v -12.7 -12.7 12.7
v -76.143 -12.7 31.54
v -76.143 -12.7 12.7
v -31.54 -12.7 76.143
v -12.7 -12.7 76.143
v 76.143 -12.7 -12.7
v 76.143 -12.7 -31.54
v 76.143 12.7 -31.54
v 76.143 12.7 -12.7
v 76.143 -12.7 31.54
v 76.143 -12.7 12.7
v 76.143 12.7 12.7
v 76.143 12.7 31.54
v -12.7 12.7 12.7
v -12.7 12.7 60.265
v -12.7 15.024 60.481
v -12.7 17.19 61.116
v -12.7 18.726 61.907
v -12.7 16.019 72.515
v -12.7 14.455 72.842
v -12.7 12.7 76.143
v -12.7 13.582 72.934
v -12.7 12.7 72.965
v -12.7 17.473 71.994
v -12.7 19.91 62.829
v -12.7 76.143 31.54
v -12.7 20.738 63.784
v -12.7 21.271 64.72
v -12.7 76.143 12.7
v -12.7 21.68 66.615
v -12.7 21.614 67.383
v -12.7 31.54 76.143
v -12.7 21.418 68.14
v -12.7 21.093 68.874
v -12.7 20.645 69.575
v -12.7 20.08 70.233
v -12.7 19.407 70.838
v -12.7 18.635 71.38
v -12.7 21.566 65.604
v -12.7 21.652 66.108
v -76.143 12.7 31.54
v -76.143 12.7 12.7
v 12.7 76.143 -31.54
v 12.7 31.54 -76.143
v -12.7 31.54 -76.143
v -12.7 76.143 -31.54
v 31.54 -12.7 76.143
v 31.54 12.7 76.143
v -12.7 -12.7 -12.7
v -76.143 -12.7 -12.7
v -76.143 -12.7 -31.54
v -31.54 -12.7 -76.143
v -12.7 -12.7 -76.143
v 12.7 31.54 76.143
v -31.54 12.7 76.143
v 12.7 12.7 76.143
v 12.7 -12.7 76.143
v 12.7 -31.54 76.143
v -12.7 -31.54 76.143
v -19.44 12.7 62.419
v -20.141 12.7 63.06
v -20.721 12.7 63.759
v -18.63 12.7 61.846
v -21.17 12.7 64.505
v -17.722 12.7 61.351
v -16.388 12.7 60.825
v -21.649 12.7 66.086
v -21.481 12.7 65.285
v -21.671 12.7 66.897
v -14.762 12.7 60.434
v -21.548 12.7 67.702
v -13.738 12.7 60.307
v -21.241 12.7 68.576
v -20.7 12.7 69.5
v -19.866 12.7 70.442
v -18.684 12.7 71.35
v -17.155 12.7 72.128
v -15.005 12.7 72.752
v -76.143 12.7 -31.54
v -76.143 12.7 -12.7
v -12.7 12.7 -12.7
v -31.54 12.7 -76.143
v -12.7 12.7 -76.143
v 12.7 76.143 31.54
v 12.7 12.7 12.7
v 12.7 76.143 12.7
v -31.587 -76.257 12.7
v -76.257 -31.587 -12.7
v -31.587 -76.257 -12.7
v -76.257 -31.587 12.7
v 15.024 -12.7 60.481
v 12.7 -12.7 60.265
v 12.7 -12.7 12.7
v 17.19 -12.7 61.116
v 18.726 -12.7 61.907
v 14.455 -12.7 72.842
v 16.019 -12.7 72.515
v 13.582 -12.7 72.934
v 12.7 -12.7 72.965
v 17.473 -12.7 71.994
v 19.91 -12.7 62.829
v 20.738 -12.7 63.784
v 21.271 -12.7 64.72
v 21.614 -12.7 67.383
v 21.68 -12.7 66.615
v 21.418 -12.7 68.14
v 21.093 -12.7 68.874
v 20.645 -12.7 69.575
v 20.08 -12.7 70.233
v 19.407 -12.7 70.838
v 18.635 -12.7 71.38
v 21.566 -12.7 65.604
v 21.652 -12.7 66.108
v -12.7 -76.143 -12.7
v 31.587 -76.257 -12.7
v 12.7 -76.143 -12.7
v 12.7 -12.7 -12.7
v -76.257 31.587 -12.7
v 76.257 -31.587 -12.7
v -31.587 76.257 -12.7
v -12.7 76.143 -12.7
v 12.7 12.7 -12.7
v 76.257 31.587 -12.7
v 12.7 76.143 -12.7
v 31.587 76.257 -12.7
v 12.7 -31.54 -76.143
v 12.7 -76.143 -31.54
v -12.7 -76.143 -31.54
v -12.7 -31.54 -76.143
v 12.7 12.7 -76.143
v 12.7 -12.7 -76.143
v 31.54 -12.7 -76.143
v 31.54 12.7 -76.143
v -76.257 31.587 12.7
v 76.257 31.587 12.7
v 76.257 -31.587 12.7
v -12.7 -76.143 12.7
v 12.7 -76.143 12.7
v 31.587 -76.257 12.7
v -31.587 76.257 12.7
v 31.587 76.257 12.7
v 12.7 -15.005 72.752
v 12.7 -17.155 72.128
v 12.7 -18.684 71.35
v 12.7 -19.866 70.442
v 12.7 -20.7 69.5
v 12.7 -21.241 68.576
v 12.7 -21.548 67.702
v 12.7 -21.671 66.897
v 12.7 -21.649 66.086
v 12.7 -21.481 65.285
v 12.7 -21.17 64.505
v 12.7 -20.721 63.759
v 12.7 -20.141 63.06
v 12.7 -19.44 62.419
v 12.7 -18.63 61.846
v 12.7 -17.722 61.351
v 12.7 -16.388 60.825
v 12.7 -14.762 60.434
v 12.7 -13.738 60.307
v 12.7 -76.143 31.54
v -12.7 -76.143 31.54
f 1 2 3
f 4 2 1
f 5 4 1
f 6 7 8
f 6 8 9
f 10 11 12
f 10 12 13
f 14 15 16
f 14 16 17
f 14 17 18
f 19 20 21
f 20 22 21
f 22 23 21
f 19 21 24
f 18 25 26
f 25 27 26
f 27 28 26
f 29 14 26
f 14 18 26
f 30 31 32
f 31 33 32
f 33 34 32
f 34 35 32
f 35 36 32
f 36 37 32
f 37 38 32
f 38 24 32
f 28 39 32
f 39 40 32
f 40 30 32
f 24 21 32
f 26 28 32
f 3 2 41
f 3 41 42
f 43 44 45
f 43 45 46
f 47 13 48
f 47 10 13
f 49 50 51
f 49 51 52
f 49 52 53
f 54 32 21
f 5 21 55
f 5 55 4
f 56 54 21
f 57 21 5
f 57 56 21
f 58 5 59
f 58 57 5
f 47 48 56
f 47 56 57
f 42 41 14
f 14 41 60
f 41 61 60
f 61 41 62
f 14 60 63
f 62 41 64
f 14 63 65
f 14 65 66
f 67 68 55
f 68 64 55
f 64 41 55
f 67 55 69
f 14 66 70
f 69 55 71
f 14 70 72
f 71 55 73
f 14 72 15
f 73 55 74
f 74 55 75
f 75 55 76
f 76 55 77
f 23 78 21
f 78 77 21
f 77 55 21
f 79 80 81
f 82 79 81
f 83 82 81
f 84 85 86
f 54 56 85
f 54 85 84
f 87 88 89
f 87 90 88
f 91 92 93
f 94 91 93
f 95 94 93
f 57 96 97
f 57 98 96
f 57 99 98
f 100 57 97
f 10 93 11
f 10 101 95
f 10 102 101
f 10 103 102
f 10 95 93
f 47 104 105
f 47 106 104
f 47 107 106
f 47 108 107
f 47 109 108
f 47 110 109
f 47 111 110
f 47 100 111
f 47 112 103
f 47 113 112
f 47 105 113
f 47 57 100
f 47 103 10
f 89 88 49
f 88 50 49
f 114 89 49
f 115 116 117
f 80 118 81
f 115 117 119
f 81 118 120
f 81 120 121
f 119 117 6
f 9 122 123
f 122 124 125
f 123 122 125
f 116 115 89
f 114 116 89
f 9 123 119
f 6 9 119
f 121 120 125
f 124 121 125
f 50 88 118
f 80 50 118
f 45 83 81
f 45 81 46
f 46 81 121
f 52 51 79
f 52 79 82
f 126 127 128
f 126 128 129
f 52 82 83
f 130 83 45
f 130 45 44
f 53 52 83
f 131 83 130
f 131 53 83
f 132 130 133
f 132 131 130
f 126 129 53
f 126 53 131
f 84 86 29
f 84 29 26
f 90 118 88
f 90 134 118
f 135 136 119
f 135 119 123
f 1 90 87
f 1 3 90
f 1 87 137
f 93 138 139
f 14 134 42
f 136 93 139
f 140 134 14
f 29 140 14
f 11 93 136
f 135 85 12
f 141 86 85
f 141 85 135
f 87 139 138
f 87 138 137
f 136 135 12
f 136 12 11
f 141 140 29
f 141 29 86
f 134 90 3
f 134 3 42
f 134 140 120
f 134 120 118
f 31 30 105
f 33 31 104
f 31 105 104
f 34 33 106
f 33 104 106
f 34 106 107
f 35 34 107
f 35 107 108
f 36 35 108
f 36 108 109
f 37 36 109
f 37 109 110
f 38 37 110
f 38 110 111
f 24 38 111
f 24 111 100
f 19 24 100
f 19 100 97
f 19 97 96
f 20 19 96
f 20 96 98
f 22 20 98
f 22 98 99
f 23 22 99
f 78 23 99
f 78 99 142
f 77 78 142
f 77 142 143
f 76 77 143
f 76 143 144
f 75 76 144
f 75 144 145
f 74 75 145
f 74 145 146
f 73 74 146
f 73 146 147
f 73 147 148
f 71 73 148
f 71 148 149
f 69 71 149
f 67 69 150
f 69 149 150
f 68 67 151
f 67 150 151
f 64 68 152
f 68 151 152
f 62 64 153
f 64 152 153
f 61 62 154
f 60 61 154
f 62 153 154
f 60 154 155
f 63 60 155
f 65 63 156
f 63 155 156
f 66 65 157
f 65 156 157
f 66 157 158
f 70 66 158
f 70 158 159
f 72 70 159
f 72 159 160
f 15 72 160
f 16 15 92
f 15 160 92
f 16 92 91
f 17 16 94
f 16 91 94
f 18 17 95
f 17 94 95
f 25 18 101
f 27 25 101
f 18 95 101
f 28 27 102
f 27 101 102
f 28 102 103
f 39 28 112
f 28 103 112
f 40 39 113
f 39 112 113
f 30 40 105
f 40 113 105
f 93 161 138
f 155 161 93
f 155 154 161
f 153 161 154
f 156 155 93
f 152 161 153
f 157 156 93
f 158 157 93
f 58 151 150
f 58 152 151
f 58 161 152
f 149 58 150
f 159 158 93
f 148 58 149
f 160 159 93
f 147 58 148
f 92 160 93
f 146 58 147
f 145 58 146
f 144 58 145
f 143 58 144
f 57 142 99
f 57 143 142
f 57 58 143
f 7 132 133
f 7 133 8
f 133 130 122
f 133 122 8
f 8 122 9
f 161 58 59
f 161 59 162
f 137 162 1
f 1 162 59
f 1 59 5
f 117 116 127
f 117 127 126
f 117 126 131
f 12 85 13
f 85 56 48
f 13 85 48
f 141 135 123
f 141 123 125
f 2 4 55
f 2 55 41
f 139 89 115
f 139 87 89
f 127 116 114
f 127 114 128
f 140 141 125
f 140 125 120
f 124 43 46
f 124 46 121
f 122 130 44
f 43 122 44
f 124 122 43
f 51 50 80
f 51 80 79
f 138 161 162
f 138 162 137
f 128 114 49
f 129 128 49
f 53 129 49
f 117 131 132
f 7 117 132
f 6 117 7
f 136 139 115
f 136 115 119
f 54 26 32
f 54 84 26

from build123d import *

# Parameters (mm, degrees)
F1_DEPTH = 12.7
F3_DEPTH = 12.7
F5_DEPTH = 12.7
F7_R     = 6.35
F8_DEPTH = 63.5


with BuildPart() as f1:
    # F0 (on Front) → F1 (new body, symmetric)
    with BuildSketch(Plane.XZ):
        Polygon((31.5395204871, 76.1431381106), (-31.5395204871, 76.1431381106), (-76.1431381106, 31.5395204871), (-76.1431381106, -31.5395204871), (-31.5395204871, -76.1431381106), (31.5395204871, -76.1431381106), (76.1431381106, -31.5395204871), (76.1431381106, 31.5395204871), align=None)
    extrude(amount=F1_DEPTH, both=True)

    # F2 (on Top) → F3 (join, symmetric)
    with BuildSketch(Plane.XY):
        Polygon((-31.5866271988, -76.2568637729), (31.5866271988, -76.2568637729), (76.2568637729, -31.5866271988), (76.2568637729, 31.5866271988), (31.5866271988, 76.2568637729), (-31.5866271988, 76.2568637729), (-76.2568637729, 31.5866271988), (-76.2568637729, -31.5866271988), align=None)
    extrude(amount=F3_DEPTH, both=True)

    # F4 (on Right) → F5 (join, symmetric)
    with BuildSketch(Plane.YZ):
        Polygon((31.5395204871, 76.1431381106), (-31.5395204871, 76.1431381106), (-76.1431381106, 31.5395204871), (-76.1431381106, -31.5395204871), (-31.5395204871, -76.1431381106), (31.5395204871, -76.1431381106), (76.1431381106, -31.5395204871), (76.1431381106, 31.5395204871), align=None)
    extrude(amount=F5_DEPTH, both=True)

    # F7 (on 3pt) → F8 (cut, symmetric)
    with BuildSketch(Plane(origin=(0, 0, 0), x_dir=(0.7071067812, 0.7071067812, 0), z_dir=(0.7071067812, -0.7071067812, 0))):
        with Locations((0, 66.614896059)):
            Circle(F7_R)
    extrude(amount=F8_DEPTH, both=True, mode=Mode.SUBTRACT)


solid = f1.part
